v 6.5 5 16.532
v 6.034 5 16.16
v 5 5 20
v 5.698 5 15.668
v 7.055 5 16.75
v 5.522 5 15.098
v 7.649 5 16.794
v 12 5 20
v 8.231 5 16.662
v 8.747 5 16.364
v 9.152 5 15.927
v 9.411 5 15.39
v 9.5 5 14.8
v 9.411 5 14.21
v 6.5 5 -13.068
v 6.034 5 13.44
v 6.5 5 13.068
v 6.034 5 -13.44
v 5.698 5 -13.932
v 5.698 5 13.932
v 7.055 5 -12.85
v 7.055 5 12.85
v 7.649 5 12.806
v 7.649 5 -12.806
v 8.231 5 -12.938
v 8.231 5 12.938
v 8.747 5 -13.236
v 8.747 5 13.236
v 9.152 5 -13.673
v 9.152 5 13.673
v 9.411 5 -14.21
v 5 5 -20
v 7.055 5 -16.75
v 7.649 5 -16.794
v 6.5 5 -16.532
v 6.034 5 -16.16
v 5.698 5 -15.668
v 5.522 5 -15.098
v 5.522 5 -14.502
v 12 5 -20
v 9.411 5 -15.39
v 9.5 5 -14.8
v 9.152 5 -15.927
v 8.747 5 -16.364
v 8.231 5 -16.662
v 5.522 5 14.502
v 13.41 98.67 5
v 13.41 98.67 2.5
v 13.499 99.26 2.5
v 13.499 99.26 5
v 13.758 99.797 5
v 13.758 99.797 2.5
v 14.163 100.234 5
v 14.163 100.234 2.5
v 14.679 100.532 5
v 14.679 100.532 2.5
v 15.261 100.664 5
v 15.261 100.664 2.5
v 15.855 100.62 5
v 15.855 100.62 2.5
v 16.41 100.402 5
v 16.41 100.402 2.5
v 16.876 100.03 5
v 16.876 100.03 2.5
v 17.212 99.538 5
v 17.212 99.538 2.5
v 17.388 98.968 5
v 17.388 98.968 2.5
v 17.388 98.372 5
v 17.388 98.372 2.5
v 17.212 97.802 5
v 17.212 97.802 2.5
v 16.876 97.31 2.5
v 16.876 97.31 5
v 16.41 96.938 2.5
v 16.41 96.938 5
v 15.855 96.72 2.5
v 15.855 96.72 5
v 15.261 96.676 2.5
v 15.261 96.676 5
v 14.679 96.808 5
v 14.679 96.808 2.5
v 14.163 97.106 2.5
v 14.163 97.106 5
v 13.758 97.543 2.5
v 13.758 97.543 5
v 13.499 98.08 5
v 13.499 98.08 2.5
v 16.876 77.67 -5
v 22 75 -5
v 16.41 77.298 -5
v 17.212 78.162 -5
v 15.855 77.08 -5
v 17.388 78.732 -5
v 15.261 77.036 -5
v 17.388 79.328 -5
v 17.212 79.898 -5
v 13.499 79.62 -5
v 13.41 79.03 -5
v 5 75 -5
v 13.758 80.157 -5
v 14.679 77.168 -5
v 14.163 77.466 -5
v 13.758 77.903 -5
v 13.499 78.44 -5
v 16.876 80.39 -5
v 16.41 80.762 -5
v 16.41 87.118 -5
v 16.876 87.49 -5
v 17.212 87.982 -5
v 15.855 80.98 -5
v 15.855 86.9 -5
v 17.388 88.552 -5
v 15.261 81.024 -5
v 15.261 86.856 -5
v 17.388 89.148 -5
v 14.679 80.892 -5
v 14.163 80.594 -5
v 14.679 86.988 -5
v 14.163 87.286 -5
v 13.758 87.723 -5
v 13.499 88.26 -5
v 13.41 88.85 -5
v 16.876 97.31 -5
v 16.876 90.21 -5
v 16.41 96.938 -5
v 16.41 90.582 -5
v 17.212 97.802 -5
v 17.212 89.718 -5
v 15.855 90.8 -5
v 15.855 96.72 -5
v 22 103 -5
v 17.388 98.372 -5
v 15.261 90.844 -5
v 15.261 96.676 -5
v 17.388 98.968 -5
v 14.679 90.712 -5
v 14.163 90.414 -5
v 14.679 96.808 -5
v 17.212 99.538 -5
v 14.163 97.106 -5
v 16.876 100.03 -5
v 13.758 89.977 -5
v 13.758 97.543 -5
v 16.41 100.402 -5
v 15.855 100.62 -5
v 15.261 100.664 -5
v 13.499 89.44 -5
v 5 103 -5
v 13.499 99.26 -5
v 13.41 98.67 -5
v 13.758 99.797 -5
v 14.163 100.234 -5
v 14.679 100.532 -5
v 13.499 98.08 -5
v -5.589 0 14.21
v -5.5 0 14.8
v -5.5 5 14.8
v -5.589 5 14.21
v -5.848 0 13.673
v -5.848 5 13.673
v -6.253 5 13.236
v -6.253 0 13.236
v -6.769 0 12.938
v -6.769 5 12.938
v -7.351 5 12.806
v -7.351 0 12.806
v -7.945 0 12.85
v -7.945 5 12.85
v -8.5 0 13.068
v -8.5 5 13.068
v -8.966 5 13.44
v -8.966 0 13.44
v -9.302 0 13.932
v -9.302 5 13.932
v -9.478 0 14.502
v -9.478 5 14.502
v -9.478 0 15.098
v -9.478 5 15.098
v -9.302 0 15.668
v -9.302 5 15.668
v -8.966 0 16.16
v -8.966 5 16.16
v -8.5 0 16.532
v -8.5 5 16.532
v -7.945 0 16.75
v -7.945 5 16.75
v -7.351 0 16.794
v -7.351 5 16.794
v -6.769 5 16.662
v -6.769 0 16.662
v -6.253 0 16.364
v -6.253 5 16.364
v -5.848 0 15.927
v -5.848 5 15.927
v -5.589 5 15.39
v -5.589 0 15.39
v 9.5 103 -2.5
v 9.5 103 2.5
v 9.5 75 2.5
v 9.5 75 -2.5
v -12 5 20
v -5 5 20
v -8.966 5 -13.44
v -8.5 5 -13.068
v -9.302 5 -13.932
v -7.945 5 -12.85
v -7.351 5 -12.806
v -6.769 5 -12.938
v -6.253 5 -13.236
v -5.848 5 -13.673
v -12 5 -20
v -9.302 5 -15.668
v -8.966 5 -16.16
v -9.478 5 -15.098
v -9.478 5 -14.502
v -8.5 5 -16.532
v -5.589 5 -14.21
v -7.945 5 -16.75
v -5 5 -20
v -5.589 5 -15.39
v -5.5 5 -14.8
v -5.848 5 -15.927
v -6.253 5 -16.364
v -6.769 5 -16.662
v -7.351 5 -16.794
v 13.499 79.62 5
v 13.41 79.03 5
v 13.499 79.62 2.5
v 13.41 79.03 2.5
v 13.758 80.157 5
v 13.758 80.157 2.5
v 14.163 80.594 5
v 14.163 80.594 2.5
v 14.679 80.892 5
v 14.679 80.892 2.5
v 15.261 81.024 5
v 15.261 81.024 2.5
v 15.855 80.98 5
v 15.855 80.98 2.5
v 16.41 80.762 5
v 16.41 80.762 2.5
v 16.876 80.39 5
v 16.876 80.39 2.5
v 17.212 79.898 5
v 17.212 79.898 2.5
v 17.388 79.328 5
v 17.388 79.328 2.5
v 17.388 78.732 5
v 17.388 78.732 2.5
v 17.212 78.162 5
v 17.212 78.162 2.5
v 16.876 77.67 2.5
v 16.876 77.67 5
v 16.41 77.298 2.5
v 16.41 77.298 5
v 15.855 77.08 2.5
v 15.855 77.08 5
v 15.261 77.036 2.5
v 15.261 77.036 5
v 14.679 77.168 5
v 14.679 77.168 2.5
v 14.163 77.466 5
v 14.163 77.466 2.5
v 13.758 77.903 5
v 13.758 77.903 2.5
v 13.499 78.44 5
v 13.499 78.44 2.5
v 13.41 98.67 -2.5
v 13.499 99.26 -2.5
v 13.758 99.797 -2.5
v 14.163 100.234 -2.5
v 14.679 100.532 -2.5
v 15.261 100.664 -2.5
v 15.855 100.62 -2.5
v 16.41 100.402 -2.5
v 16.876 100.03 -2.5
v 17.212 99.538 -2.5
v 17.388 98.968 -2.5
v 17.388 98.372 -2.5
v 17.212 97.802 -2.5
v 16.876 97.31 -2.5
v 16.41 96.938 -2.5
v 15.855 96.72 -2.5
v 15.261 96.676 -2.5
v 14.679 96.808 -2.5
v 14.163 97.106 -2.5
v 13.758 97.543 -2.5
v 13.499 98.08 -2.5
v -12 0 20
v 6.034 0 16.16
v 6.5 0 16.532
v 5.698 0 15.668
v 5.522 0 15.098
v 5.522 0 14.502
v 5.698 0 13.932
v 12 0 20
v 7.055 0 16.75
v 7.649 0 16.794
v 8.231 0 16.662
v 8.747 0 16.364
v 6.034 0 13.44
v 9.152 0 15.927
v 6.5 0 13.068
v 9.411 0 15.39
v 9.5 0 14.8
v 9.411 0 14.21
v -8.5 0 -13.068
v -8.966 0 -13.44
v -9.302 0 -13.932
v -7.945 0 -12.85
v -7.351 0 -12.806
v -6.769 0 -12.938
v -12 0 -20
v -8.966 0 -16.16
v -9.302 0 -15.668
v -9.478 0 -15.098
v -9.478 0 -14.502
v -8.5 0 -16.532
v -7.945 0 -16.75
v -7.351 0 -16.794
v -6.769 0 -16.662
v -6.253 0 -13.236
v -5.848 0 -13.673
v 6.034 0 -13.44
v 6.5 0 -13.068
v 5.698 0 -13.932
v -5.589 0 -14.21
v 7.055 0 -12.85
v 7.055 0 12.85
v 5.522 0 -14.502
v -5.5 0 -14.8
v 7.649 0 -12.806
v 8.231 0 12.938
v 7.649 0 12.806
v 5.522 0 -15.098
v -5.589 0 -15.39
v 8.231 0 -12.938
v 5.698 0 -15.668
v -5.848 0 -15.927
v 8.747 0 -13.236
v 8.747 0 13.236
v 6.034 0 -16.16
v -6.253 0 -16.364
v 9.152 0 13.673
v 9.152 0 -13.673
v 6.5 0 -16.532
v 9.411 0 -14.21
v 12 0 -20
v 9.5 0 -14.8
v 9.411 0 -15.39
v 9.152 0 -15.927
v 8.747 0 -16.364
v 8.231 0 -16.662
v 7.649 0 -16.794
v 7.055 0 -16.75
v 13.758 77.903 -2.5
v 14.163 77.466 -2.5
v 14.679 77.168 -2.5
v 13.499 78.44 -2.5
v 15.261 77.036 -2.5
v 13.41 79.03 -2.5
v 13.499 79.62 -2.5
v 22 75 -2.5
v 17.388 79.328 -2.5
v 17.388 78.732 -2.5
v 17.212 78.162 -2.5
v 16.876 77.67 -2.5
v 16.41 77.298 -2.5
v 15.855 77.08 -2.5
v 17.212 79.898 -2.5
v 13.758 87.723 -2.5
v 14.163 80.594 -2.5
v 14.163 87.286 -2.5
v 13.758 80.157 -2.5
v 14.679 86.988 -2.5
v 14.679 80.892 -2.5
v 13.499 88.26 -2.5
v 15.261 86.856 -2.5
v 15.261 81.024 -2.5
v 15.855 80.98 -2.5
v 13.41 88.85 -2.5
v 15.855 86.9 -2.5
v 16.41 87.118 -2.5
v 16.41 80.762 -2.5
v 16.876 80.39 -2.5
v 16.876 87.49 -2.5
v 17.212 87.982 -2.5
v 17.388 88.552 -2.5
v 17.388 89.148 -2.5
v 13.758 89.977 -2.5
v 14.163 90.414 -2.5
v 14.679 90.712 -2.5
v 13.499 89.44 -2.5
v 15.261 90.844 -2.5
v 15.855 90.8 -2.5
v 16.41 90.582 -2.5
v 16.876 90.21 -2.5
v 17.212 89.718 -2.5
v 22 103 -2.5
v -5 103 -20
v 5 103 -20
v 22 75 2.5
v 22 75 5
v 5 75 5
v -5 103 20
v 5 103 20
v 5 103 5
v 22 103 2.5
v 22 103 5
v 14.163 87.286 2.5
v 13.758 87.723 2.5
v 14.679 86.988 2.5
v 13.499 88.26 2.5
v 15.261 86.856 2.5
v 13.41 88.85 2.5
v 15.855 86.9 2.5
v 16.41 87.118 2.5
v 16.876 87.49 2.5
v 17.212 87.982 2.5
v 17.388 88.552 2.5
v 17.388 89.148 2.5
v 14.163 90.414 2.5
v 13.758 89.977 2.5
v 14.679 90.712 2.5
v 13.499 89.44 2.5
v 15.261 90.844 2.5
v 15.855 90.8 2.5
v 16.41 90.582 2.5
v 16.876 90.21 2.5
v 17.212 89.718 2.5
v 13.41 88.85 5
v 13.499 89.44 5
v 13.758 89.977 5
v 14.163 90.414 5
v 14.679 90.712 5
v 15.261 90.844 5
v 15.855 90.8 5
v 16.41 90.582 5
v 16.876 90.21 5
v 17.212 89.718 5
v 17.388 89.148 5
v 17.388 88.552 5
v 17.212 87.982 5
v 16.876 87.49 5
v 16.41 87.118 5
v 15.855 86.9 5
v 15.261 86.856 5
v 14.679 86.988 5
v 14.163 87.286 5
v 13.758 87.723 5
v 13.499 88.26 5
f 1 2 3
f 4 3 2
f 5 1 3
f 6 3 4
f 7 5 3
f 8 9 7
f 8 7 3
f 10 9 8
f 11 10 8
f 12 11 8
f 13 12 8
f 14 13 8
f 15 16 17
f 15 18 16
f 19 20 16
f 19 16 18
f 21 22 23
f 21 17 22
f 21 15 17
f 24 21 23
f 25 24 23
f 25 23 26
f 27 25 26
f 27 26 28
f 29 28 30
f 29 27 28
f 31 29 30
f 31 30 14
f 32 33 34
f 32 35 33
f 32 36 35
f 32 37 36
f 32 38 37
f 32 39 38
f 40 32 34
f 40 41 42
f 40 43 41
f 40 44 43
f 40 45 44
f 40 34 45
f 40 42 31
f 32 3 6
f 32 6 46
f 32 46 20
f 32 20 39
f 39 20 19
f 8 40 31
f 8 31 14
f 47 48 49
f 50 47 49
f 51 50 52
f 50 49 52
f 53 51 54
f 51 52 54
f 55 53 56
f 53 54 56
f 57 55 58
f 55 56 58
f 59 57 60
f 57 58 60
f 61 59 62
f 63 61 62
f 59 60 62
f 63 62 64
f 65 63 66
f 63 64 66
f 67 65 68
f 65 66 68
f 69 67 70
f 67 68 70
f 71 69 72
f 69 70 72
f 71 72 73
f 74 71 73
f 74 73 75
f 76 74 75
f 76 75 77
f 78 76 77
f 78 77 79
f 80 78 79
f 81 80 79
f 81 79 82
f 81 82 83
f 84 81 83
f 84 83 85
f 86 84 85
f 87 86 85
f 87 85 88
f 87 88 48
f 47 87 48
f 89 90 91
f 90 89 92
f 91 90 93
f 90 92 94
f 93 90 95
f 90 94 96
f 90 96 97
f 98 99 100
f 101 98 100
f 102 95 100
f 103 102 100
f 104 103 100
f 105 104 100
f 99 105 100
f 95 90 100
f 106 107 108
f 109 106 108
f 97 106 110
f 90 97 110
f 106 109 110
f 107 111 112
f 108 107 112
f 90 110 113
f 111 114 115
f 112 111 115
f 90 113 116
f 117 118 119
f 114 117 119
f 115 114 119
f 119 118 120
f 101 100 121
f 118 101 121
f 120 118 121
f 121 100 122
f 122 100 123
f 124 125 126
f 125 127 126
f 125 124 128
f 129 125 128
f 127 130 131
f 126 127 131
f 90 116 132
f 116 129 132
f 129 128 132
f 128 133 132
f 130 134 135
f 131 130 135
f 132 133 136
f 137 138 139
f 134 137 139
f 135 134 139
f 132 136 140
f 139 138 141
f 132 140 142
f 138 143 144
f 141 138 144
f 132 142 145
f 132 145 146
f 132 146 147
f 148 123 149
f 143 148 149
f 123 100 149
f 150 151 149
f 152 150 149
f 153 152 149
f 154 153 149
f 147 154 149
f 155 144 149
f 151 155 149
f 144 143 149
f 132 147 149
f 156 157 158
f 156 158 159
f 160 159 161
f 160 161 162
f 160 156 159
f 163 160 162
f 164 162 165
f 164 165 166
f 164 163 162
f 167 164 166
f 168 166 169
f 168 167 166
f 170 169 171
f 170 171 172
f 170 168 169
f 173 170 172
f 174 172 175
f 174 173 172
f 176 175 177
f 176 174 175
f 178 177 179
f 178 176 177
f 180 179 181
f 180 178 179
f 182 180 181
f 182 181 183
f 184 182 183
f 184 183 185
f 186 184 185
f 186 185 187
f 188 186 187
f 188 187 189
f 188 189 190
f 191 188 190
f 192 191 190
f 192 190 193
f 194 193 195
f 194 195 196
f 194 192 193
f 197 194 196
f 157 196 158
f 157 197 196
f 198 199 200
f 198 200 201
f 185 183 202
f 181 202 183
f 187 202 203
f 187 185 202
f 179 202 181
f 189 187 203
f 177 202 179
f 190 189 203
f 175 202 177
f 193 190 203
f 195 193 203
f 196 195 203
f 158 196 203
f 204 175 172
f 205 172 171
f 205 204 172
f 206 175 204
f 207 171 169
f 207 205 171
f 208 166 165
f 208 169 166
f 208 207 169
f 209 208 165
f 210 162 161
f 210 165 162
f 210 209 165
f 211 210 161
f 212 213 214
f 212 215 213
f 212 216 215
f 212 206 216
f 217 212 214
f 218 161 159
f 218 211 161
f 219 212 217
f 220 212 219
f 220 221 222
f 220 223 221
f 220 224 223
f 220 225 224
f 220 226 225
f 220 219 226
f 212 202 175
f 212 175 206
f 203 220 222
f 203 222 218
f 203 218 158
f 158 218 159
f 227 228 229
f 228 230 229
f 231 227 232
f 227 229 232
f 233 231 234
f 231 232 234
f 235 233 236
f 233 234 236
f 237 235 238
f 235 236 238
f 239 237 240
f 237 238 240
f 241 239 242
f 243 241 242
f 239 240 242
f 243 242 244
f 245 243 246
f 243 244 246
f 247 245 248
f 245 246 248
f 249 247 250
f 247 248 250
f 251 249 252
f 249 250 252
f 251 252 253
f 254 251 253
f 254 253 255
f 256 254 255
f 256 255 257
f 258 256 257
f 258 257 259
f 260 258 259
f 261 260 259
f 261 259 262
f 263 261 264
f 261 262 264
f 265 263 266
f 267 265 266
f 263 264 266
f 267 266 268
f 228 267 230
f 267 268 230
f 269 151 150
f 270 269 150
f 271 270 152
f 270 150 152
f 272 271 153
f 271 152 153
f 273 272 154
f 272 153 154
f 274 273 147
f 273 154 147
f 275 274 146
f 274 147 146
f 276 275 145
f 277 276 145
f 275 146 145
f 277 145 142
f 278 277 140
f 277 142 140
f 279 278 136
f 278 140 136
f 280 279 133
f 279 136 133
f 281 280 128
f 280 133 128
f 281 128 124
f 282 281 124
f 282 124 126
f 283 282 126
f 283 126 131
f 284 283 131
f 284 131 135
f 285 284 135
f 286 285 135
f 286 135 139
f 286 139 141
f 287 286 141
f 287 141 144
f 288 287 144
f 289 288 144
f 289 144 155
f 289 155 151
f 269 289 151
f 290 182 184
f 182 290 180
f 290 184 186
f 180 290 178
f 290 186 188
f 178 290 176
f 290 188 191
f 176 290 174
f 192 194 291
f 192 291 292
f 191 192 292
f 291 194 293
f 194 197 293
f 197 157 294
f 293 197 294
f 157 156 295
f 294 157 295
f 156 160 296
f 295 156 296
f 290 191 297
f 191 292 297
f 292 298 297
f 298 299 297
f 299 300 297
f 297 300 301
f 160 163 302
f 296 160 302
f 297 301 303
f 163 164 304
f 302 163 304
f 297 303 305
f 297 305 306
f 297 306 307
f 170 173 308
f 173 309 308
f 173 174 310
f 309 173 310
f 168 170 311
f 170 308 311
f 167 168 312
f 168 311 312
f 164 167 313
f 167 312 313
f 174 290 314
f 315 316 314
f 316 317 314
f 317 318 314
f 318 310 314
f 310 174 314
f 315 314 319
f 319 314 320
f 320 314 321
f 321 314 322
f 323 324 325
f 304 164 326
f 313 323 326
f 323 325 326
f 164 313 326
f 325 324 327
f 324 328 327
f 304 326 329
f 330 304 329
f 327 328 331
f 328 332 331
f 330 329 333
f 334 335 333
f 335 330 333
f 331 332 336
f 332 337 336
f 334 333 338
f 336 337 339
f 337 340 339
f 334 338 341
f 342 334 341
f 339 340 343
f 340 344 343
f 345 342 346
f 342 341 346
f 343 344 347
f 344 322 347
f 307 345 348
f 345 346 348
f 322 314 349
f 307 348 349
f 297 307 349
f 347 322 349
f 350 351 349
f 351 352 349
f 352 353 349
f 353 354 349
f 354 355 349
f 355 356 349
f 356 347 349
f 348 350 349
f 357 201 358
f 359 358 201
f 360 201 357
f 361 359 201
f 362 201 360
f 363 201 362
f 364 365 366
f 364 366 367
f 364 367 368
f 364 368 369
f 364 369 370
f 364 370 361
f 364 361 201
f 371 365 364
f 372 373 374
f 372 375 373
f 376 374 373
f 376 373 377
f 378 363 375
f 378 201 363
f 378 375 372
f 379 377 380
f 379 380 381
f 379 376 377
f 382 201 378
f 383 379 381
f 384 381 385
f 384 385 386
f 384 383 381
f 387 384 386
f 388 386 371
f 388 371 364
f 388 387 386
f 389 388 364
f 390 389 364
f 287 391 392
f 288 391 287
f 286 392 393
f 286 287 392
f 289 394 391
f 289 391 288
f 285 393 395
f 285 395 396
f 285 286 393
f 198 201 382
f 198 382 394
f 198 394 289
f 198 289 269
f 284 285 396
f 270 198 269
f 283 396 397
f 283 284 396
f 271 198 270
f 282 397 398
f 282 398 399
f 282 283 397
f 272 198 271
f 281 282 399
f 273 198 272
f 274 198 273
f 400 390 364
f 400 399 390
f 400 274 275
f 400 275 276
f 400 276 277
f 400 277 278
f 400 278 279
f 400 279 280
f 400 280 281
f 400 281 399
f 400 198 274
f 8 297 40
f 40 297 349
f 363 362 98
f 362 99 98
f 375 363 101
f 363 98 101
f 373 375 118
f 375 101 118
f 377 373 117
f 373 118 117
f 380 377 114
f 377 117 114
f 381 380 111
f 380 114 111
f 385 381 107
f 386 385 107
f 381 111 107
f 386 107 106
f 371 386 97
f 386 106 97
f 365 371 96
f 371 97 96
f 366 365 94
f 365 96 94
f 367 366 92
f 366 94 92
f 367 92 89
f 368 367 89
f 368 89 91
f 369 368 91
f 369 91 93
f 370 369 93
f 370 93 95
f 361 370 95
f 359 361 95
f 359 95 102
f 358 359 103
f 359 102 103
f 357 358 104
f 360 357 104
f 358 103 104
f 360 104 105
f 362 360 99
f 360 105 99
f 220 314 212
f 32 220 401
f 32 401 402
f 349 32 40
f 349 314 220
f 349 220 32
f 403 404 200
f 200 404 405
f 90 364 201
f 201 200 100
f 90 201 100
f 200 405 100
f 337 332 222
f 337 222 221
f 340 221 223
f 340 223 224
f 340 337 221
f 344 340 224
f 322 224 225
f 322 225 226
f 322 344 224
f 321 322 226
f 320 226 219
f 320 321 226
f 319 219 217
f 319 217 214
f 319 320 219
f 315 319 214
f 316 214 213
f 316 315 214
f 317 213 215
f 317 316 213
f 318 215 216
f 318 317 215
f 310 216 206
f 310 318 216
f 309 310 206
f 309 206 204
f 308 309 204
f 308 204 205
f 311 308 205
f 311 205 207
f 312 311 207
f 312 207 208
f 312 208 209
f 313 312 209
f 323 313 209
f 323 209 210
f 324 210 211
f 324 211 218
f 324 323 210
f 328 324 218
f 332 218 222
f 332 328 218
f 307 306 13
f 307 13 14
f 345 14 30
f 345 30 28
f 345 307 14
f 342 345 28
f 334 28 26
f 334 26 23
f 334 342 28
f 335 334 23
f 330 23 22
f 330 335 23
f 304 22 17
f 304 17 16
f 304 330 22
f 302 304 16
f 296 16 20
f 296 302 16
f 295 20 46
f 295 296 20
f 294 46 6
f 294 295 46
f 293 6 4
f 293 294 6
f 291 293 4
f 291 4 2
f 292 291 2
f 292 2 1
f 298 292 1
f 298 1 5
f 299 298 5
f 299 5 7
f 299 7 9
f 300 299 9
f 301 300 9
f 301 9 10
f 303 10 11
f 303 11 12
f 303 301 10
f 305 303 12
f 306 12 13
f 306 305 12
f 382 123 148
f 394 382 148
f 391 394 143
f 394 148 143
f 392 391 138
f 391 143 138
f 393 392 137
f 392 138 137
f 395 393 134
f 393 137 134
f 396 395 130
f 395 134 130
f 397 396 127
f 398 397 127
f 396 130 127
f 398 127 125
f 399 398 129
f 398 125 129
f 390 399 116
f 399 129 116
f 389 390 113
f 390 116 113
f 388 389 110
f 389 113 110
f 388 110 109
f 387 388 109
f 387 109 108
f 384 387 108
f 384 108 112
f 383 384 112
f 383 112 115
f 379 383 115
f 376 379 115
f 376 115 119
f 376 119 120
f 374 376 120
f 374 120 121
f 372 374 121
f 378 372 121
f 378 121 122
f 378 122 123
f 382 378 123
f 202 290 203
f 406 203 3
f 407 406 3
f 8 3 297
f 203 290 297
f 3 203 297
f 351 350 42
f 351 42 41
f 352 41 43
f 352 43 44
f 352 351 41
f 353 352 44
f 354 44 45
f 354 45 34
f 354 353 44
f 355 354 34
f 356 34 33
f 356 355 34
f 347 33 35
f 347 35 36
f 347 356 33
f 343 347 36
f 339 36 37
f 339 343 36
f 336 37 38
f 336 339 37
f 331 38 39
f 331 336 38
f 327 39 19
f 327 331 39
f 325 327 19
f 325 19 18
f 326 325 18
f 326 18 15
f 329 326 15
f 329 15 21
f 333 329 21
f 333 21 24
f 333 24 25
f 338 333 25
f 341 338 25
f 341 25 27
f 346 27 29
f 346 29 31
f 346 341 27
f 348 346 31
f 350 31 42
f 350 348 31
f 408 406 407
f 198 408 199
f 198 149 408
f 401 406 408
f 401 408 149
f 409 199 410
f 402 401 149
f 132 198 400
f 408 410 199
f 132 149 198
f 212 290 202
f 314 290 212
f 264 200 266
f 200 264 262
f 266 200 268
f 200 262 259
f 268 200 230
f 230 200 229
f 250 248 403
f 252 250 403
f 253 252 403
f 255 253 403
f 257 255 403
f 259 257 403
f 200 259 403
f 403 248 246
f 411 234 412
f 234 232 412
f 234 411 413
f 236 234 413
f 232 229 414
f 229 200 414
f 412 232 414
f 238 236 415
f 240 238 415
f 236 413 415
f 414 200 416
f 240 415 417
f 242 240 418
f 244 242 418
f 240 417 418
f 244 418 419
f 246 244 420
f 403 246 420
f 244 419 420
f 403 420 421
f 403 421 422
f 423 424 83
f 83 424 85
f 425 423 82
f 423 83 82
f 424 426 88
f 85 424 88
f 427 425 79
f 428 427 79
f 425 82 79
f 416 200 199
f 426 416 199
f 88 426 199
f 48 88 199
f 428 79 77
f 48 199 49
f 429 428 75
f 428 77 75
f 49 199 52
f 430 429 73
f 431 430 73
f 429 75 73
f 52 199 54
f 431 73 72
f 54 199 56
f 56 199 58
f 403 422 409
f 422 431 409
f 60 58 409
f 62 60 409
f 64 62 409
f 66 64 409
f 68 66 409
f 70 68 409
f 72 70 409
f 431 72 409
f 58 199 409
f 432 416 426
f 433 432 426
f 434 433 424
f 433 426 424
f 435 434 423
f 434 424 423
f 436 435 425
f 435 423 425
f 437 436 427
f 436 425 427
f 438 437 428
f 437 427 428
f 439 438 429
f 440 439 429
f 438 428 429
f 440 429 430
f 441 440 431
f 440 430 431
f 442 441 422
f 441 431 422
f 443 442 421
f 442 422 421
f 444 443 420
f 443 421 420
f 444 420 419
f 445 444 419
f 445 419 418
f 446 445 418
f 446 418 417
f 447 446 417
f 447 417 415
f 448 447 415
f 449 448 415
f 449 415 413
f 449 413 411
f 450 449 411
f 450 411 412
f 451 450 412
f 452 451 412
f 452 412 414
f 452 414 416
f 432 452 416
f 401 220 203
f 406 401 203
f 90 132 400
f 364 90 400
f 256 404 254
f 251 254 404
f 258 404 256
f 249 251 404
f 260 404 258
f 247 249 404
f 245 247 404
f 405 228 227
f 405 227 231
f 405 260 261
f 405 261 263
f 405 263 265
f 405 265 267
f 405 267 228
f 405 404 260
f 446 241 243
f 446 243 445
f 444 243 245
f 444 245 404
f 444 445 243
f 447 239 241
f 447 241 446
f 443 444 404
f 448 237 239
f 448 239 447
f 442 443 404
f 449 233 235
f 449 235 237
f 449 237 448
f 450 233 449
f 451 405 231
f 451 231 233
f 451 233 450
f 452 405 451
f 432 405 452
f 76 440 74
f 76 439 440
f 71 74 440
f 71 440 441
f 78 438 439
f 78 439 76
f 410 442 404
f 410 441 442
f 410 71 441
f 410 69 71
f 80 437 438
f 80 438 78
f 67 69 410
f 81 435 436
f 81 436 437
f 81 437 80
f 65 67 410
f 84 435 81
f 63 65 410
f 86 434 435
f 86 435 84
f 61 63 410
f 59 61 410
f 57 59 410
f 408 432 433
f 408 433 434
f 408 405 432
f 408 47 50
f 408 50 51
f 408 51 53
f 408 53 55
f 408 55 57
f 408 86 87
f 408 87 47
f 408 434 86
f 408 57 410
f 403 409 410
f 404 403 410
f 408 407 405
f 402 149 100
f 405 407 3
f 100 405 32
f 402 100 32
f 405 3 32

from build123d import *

# Parameters (mm, degrees)
SKETCH_1_W          = 24
SKETCH_1_H          = 40
SKETCH_1_R          = 2
EXTRUDE_1_DEPTH     = 5
EXTRUDE_5_DEPTH     = 98
SKETCH_10_W         = 10
SKETCH_10_H         = 28
EXTRUDE_6_DEPTH     = 18.5
SKETCH_12_R         = 2
CUT_EXTRUDE_4_DEPTH = 24.25
SKETCH_13_W         = 12
SKETCH_13_H         = 28
CUT_EXTRUDE_5_DEPTH = 2
SKETCH_14_W         = 2
SKETCH_14_H         = 4
CUT_EXTRUDE_6_DEPTH = 34
SKETCH_15_W         = 12.5
SKETCH_15_H         = 0.5
CUT_EXTRUDE_7_DEPTH = 34


with BuildPart() as part:
    # 草图1 → 凸台-拉伸1 (new body)
    with BuildSketch(Plane(origin=(0, 0, 0), x_dir=(1, 0, 0), z_dir=(0, 1, 0))):
        Rectangle(SKETCH_1_W, SKETCH_1_H)
        with Locations((7.5, -14.8)):
            Circle(SKETCH_1_R, mode=Mode.SUBTRACT)
        with Locations((-7.5, -14.8)):
            Circle(SKETCH_1_R, mode=Mode.SUBTRACT)
        with Locations((-7.5, 14.8)):
            Circle(SKETCH_1_R, mode=Mode.SUBTRACT)
        with Locations((7.5, 14.8)):
            Circle(SKETCH_1_R, mode=Mode.SUBTRACT)
    extrude(amount=EXTRUDE_1_DEPTH)

    # 草图8 → 凸台-拉伸5 (add)
    with BuildSketch(Plane(origin=(0, 5, 0), x_dir=(1, 0, 0), z_dir=(0, 1, 0))):
        Polygon((-5, 0), (-5, -20), (5, -20), (5, 20), (-5, 20), align=None)
    extrude(amount=EXTRUDE_5_DEPTH)

    # 草图10 → 凸台-拉伸6 (add)
    with BuildSketch(Plane(origin=(5, 0, 0), x_dir=(0, 0, -1), z_dir=(1, 0, 0))):
        with Locations((0, 89)):
            Rectangle(SKETCH_10_W, SKETCH_10_H)
    extrude(amount=EXTRUDE_6_DEPTH)

    # 草图12 → 切除-拉伸4 (cut, symmetric)
    with BuildSketch(Plane(origin=(0, 0, -5), x_dir=(-1, 0, 0), z_dir=(0, 0, -1))):
        with Locations((-15.41, 98.67)):
            Circle(SKETCH_12_R)
        with Locations((-15.41, 88.85)):
            Circle(SKETCH_12_R)
        with Locations((-15.41, 79.03)):
            Circle(SKETCH_12_R)
    extrude(amount=CUT_EXTRUDE_4_DEPTH, both=True, mode=Mode.SUBTRACT)

    # 草图13 → 切除-拉伸5 (cut, symmetric)
    with BuildSketch(Plane.XY):
        with Locations((17.5, 89)):
            Rectangle(SKETCH_13_W, SKETCH_13_H)
    extrude(amount=CUT_EXTRUDE_5_DEPTH, both=True, mode=Mode.SUBTRACT)

    # 草图14 → 切除-拉伸6 (cut)
    with BuildSketch(Plane(origin=(0, 103, 0), x_dir=(1, 0, 0), z_dir=(0, 1, 0))):
        with Locations((10.5, 0)):
            Rectangle(SKETCH_14_W, SKETCH_14_H)
        Polygon((22, 5), (23.5, 5), (23.5, 2), (23.5, -2), (23.5, -5), (22, -5), (22, -2.5), (22, 2.5), align=None)
    extrude(amount=-CUT_EXTRUDE_6_DEPTH, mode=Mode.SUBTRACT)

    # 草图15 → 切除-拉伸7 (cut)
    with BuildSketch(Plane(origin=(0, 103, 0), x_dir=(1, 0, 0), z_dir=(0, 1, 0))):
        with Locations((15.75, 2.25)):
            Rectangle(SKETCH_15_W, SKETCH_15_H)
        with Locations((15.75, -2.25)):
            Rectangle(SKETCH_15_W, SKETCH_15_H)
    extrude(amount=-CUT_EXTRUDE_7_DEPTH, mode=Mode.SUBTRACT)


solid = part.part
